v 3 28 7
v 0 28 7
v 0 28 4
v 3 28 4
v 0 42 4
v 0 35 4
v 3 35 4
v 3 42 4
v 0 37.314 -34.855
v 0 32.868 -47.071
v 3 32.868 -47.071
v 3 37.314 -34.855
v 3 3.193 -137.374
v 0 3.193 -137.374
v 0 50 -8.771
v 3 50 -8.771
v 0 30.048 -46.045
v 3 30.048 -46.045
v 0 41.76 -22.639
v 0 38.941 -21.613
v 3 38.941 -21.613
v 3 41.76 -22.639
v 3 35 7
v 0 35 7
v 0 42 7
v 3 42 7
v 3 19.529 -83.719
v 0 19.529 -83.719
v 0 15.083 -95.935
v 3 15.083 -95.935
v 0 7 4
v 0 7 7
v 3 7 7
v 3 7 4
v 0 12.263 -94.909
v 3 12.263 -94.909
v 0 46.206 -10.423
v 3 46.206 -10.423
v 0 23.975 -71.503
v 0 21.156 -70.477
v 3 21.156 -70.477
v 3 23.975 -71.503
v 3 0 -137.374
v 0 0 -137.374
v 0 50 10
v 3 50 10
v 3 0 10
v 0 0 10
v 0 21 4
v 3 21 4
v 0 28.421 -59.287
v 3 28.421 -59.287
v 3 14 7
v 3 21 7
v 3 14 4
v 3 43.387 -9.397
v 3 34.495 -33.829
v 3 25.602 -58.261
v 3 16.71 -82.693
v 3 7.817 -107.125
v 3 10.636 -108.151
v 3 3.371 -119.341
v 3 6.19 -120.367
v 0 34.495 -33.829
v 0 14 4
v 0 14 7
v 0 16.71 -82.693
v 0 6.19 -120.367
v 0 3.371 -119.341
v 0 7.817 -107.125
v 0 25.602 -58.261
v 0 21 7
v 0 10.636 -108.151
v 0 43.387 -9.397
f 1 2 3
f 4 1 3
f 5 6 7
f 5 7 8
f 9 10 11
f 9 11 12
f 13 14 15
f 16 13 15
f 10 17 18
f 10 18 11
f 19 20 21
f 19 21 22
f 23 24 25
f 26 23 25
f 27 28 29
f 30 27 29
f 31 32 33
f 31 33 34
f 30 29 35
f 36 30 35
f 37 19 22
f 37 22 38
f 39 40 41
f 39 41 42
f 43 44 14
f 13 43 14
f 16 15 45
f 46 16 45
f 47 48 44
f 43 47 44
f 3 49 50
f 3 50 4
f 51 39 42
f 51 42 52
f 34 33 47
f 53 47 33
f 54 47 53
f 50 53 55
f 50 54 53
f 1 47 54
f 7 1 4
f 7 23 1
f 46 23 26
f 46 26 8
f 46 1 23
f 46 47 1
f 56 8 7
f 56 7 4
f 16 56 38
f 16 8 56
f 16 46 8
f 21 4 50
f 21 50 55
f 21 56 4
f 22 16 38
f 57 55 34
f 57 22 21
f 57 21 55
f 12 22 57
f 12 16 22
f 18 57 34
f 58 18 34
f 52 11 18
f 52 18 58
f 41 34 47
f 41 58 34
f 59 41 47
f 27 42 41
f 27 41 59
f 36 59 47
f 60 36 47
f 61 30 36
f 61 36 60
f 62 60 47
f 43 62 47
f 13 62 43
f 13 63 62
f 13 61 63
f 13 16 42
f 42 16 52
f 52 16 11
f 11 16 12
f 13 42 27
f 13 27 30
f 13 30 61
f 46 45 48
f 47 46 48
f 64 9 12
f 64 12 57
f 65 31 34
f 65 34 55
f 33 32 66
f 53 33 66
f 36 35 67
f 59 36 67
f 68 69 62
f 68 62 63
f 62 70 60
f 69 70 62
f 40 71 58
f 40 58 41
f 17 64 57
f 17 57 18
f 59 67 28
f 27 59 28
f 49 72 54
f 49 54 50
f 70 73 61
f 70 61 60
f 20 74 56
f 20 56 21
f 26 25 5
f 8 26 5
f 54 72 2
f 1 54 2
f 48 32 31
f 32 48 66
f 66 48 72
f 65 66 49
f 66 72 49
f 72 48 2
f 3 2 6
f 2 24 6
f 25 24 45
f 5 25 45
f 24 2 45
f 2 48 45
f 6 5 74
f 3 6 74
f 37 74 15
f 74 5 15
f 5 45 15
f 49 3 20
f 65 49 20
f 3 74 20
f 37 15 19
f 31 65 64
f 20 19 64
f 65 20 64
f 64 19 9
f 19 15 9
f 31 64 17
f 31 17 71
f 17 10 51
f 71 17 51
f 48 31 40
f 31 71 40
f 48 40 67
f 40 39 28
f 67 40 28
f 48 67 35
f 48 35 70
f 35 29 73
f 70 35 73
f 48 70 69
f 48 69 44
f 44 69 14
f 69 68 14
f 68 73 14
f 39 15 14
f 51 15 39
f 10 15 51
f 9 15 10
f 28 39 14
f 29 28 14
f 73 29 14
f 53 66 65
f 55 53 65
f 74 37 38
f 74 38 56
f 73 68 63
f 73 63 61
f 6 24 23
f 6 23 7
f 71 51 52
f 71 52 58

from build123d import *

# Parameters (mm, degrees)
SKETCH1_W           = 3
SKETCH1_H           = 7
BOSS_EXTRUDE1_DEPTH = 3


with BuildPart() as part:
    # Sketch1 → Boss-Extrude1 (new body)
    with BuildSketch(Plane(origin=(0, 0, 0), x_dir=(0, 0, -1), z_dir=(1, 0, 0))):
        Polygon((0, 50), (-10, 50), (-10, 0), (137.373870973, 0), (137.373870973, 3.192533317), (8.7714132, 50), align=None)
        Polygon((10.422986638, 46.206343112), (9.396926208, 43.387265249), (21.612930278, 38.941003386), (22.638990708, 41.760081248), align=None, mode=Mode.SUBTRACT)
        Polygon((34.854994778, 37.313819385), (33.828934348, 34.494741523), (46.044938419, 30.04847966), (47.070998848, 32.867557522), align=None, mode=Mode.SUBTRACT)
        Polygon((119.34096284, 3.37090848), (120.36702327, 6.189986343), (108.1510192, 10.636248206), (107.12495877, 7.817170343), align=None, mode=Mode.SUBTRACT)
        Polygon((95.935015129, 15.082510069), (94.908954699, 12.263432207), (82.692950629, 16.70969407), (83.719011059, 19.528771932), align=None, mode=Mode.SUBTRACT)
        Polygon((59.287002919, 28.421295659), (58.260942489, 25.602217796), (70.476946559, 21.155955933), (71.503006989, 23.975033796), align=None, mode=Mode.SUBTRACT)
        with Locations((-5.5, 38.5)):
            Rectangle(SKETCH1_W, SKETCH1_H, mode=Mode.SUBTRACT)
        with Locations((-5.5, 24.5)):
            Rectangle(SKETCH1_W, SKETCH1_H, mode=Mode.SUBTRACT)
        with Locations((-5.5, 10.5)):
            Rectangle(SKETCH1_W, SKETCH1_H, mode=Mode.SUBTRACT)
    extrude(amount=BOSS_EXTRUDE1_DEPTH)


solid = part.part
